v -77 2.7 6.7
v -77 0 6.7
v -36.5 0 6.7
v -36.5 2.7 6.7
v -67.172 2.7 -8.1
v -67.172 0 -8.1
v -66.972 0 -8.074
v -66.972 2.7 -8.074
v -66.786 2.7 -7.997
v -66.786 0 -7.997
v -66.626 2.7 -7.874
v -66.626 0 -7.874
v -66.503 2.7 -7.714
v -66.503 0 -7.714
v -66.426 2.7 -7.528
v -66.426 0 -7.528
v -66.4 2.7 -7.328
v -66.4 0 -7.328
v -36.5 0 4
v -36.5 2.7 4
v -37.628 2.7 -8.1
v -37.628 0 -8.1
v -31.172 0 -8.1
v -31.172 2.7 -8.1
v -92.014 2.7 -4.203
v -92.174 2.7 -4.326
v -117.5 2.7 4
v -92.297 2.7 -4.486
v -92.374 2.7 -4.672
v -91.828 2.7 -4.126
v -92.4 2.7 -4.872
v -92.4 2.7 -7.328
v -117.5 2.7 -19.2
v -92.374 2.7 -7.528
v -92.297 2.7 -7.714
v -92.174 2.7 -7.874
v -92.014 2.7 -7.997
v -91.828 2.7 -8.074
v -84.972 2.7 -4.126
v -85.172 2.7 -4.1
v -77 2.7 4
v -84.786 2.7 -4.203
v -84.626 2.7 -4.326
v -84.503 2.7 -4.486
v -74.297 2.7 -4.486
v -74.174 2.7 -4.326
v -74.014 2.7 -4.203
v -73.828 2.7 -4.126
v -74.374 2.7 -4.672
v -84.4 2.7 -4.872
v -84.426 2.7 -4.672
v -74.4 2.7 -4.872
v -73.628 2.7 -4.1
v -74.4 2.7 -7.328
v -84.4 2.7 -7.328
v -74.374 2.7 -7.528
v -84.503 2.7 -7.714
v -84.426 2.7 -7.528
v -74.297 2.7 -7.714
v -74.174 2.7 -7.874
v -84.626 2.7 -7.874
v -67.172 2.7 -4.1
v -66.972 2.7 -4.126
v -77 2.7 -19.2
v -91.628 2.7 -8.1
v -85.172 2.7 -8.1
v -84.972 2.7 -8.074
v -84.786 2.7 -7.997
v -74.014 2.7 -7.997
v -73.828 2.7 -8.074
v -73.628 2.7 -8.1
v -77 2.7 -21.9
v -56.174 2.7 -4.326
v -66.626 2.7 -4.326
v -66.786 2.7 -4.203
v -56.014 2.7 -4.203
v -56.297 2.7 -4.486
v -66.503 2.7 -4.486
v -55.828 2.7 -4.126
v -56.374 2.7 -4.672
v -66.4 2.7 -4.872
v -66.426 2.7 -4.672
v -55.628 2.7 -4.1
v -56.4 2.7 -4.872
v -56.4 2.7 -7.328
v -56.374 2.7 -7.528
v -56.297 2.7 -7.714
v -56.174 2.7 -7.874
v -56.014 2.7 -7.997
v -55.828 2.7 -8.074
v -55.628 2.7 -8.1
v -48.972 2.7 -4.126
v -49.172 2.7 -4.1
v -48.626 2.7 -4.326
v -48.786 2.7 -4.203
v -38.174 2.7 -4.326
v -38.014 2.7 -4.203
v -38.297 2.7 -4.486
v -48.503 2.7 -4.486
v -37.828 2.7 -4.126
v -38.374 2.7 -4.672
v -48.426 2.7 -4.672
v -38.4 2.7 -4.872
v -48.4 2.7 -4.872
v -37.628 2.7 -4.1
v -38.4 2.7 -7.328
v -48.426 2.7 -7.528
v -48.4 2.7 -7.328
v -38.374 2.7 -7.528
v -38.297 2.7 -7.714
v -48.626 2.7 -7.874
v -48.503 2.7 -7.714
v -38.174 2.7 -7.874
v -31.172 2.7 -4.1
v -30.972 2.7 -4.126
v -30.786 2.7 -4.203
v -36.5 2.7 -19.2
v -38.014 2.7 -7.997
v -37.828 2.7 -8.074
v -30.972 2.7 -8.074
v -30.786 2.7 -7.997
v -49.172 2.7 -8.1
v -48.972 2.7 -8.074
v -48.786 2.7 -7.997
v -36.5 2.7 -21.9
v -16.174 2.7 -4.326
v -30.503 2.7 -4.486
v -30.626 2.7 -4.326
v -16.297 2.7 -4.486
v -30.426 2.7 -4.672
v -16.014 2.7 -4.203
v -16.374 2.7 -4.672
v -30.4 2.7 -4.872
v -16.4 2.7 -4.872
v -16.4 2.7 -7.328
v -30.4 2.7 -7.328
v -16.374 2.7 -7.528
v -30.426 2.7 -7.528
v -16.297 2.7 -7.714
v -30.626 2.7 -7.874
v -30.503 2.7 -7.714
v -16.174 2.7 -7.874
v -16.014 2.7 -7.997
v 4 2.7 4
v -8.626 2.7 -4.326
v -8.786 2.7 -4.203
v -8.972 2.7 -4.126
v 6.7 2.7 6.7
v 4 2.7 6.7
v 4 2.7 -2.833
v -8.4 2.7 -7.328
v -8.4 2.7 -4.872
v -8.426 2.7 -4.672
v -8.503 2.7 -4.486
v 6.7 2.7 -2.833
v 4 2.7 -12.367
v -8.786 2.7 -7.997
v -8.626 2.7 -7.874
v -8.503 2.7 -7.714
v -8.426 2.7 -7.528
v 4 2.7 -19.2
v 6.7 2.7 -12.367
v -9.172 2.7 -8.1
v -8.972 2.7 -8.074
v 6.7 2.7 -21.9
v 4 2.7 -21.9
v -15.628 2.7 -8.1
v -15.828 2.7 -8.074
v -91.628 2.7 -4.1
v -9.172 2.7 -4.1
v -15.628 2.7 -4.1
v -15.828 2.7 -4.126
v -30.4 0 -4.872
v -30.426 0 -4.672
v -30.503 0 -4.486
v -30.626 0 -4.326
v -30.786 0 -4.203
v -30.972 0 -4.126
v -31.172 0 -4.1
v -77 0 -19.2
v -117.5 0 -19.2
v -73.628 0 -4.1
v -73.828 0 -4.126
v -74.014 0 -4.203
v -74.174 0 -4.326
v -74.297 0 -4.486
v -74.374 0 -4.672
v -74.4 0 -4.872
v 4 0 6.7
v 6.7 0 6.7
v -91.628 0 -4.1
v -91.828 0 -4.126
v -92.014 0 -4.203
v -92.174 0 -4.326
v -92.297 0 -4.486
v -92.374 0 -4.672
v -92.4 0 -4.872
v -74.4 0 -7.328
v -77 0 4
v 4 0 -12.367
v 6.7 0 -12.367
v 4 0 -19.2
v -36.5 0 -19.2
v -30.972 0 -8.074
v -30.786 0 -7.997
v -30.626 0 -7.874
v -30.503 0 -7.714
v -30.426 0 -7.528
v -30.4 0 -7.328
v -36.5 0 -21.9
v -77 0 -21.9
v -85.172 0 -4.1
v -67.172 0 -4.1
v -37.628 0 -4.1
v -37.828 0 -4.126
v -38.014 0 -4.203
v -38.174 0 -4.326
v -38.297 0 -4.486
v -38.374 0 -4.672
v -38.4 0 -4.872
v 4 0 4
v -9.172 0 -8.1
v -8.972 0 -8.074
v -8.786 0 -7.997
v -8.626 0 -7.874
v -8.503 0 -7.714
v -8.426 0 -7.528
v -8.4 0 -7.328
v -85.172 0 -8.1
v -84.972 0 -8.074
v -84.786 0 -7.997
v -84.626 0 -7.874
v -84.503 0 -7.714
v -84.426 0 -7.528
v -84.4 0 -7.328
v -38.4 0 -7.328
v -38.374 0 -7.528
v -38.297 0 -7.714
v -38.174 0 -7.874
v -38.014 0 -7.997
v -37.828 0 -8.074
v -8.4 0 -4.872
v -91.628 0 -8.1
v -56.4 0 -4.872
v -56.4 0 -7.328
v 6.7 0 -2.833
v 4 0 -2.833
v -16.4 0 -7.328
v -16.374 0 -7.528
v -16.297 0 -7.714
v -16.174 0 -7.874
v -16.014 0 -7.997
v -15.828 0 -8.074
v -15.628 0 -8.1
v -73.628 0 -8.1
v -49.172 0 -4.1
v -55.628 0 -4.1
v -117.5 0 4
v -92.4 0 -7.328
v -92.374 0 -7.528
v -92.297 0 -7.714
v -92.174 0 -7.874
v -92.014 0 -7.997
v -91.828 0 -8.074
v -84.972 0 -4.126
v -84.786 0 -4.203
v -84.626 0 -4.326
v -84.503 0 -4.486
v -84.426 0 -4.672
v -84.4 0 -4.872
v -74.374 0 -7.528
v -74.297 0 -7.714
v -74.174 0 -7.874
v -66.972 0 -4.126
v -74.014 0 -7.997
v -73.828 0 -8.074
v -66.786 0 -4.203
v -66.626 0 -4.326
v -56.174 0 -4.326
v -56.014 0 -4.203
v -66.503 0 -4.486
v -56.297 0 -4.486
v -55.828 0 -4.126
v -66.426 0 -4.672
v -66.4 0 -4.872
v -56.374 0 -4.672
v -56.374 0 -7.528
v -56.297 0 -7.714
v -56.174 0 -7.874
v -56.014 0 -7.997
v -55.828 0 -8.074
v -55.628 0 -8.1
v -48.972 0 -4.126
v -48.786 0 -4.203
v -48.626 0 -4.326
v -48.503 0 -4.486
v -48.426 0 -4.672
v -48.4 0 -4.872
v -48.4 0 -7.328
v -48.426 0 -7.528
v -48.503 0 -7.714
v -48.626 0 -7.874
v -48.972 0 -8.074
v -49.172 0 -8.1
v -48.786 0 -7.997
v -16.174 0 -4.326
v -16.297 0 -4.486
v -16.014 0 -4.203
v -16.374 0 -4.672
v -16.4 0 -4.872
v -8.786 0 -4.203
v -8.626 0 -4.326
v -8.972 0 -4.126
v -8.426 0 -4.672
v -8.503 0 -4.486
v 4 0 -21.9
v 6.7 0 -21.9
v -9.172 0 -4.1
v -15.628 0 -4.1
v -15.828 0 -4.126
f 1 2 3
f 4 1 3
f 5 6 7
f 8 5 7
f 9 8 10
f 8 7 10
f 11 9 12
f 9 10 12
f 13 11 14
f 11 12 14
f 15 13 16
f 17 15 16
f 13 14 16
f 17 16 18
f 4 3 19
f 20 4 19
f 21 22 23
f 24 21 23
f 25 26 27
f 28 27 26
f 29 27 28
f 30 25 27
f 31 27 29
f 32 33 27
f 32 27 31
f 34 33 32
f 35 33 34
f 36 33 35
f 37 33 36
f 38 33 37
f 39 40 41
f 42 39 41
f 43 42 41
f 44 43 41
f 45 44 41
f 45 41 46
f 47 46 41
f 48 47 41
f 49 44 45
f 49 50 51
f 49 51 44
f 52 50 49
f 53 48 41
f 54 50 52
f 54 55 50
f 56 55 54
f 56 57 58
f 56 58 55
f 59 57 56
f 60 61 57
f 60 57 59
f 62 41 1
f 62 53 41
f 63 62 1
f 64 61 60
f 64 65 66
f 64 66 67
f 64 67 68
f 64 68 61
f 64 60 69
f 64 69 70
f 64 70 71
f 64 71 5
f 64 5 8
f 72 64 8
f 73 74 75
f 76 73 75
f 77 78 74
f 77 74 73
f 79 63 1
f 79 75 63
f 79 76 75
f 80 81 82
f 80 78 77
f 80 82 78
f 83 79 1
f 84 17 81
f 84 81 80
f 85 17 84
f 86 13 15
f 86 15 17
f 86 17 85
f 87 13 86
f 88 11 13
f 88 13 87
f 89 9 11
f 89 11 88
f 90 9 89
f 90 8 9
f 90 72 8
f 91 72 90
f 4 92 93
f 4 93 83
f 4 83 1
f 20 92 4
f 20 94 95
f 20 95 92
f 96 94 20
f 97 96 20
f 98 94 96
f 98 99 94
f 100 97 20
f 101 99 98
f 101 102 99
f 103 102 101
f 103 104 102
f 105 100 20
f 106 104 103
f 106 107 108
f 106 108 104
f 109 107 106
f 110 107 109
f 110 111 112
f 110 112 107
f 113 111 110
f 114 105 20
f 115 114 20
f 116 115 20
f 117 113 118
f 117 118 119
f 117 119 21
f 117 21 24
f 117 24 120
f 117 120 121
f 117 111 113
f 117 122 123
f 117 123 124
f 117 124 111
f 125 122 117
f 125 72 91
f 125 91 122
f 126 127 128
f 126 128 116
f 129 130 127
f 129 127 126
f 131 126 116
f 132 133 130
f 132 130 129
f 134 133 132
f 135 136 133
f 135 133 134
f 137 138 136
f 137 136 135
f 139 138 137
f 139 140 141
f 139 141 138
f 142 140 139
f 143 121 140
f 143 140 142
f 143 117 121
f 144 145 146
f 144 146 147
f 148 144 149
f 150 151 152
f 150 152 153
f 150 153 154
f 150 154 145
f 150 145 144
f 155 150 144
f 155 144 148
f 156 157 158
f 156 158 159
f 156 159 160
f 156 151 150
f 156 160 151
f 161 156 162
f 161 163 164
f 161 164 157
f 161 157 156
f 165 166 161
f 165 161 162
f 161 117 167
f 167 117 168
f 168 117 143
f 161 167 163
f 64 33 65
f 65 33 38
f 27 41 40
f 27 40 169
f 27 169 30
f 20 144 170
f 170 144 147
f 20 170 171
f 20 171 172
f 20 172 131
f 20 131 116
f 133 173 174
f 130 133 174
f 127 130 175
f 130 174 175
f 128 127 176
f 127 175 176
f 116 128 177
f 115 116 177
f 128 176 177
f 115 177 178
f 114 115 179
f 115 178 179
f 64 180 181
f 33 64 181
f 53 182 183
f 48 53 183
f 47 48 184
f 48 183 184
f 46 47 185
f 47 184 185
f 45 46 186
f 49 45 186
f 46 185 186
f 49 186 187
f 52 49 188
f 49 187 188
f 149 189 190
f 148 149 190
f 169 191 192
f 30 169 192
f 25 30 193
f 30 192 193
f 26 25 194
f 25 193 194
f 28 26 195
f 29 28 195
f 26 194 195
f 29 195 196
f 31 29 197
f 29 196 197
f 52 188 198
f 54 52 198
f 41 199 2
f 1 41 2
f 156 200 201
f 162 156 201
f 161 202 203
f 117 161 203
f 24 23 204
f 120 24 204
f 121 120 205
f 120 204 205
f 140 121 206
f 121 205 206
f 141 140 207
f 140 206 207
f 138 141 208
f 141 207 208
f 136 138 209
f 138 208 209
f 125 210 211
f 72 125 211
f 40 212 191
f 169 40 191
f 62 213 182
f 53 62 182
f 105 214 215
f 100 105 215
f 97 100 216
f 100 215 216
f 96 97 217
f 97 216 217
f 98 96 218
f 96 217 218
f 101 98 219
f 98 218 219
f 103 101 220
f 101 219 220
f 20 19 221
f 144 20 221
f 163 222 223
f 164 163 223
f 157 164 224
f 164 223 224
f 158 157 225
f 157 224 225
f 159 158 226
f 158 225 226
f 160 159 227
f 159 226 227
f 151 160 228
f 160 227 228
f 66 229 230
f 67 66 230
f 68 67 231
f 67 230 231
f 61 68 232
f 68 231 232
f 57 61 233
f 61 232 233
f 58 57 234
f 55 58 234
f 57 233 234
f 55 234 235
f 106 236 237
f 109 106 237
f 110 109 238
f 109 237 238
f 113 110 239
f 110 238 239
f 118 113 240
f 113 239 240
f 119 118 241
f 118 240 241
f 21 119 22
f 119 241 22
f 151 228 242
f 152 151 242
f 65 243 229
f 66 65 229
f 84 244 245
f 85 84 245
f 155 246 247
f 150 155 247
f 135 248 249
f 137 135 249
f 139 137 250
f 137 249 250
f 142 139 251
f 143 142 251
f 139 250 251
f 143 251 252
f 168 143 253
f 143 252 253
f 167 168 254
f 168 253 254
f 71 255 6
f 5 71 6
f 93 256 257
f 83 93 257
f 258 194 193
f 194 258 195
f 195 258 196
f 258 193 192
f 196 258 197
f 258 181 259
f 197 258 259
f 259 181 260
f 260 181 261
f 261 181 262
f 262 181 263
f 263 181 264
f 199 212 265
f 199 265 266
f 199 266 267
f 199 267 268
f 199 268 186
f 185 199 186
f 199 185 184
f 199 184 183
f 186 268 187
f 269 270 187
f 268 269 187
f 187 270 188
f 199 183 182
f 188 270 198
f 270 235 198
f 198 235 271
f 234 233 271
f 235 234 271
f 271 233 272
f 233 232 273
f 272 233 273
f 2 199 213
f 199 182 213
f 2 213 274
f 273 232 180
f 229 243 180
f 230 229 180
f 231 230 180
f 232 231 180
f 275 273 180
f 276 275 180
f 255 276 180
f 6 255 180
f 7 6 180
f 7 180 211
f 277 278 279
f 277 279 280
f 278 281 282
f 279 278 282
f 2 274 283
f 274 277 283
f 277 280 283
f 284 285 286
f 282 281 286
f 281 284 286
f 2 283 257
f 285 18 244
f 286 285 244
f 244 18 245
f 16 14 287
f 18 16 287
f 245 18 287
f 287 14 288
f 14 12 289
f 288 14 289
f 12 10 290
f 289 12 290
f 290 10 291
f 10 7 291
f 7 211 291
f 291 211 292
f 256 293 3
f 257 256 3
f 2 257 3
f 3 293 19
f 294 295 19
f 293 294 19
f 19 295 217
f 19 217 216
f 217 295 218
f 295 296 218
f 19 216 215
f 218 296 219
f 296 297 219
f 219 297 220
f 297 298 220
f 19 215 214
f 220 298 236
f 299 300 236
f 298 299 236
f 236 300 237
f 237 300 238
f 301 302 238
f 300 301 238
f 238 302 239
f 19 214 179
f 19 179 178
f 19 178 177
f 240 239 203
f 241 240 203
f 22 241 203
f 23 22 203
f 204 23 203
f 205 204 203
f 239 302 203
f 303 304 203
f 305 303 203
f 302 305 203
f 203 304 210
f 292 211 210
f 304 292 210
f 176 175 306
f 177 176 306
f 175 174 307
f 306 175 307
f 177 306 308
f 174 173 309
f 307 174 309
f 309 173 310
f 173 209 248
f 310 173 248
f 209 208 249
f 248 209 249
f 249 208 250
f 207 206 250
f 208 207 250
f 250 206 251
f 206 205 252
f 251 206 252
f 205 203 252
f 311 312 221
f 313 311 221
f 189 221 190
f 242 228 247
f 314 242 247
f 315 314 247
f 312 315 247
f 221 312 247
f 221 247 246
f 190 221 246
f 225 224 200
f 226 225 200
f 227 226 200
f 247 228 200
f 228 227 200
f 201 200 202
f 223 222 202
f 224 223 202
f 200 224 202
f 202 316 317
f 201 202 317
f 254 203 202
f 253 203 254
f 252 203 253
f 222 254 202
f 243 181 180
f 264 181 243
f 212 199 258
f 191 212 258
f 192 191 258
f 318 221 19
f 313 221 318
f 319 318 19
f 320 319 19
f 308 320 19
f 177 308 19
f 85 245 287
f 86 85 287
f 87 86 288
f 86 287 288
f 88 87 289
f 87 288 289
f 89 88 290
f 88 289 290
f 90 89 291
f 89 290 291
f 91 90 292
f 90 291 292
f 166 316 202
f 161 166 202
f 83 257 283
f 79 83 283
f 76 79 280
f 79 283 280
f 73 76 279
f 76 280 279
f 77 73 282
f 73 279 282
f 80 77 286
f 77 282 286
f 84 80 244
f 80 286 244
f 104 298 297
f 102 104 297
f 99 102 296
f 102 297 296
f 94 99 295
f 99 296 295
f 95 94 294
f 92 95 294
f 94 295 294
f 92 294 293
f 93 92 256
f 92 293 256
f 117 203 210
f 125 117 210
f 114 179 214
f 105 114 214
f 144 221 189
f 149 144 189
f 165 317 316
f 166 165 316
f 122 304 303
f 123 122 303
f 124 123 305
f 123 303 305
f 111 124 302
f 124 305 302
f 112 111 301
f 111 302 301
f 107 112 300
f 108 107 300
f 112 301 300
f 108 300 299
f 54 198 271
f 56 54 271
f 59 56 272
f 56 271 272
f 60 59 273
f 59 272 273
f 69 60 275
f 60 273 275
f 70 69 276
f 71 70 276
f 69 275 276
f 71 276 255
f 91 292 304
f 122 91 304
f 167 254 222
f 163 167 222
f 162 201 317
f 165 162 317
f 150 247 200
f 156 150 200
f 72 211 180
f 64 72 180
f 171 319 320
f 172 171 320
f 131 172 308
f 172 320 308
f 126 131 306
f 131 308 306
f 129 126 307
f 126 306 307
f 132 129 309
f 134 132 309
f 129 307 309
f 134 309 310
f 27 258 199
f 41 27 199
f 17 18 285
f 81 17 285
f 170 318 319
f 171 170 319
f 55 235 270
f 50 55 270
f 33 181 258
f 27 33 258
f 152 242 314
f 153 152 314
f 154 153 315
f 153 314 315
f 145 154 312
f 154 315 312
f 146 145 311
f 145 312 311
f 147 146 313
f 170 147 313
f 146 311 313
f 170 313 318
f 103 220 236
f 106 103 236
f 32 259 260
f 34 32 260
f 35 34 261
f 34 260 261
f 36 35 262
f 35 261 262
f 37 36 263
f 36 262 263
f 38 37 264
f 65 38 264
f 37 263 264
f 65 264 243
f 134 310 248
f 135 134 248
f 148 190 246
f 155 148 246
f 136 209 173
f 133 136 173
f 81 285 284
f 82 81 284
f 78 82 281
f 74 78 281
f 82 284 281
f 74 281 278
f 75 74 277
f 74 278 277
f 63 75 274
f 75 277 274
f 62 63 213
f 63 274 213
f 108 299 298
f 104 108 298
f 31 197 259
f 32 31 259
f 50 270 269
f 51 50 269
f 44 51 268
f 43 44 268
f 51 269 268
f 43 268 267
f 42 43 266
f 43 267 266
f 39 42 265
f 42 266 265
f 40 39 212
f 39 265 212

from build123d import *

# Parameters (mm, degrees)
BOSS_EXTRUDE1_DEPTH = 2.7


with BuildPart() as part:
    # Sketch1 → Boss-Extrude1 (new body)
    with BuildSketch(Plane(origin=(0, 0, 0), x_dir=(1, 0, 0), z_dir=(0, 1, 0))):
        Polygon((4, 2.833333333), (4, 12.366666667), (6.7, 12.366666667), (6.7, 21.9), (4, 21.9), (4, 19.2), (-36.5, 19.2), (-36.5, 21.9), (-77, 21.9), (-77, 19.2), (-117.5, 19.2), (-117.5, 12.366666667), (-117.5, 2.833333333), (-117.5, -4), (-77, -4), (-77, -6.7), (-36.5, -6.7), (-36.5, -4), (4, -4), (4, -6.7), (6.7, -6.7), (6.7, 2.833333333), align=None)
        with BuildLine():
            Line((-91.627899854, 8.1), (-85.172100146, 8.1))
            ThreePointArc((-85.172100146, 8.1), (-84.626142897, 7.873857103), (-84.4, 7.327899854))
            Line((-84.4, 7.327899854), (-84.4, 4.872100146))
            ThreePointArc((-84.4, 4.872100146), (-84.626142897, 4.326142897), (-85.172100146, 4.1))
            Line((-85.172100146, 4.1), (-91.627899854, 4.1))
            ThreePointArc((-91.627899854, 4.1), (-92.173857103, 4.326142897), (-92.4, 4.872100146))
            Line((-92.4, 4.872100146), (-92.4, 7.327899854))
            ThreePointArc((-92.4, 7.327899854), (-92.173857103, 7.873857103), (-91.627899854, 8.1))
        make_face(mode=Mode.SUBTRACT)
        with BuildLine():
            Line((-73.627899854, 8.1), (-67.172100146, 8.1))
            ThreePointArc((-67.172100146, 8.1), (-66.626142897, 7.873857103), (-66.4, 7.327899854))
            Line((-66.4, 7.327899854), (-66.4, 4.872100146))
            ThreePointArc((-66.4, 4.872100146), (-66.626142897, 4.326142897), (-67.172100146, 4.1))
            Line((-67.172100146, 4.1), (-73.627899854, 4.1))
            ThreePointArc((-73.627899854, 4.1), (-74.173857103, 4.326142897), (-74.4, 4.872100146))
            Line((-74.4, 4.872100146), (-74.4, 7.327899854))
            ThreePointArc((-74.4, 7.327899854), (-74.173857103, 7.873857103), (-73.627899854, 8.1))
        make_face(mode=Mode.SUBTRACT)
        with BuildLine():
            Line((-55.627899854, 8.1), (-49.172100146, 8.1))
            ThreePointArc((-49.172100146, 8.1), (-48.626142897, 7.873857103), (-48.4, 7.327899854))
            Line((-48.4, 7.327899854), (-48.4, 4.872100146))
            ThreePointArc((-48.4, 4.872100146), (-48.626142897, 4.326142897), (-49.172100146, 4.1))
            Line((-49.172100146, 4.1), (-55.627899854, 4.1))
            ThreePointArc((-55.627899854, 4.1), (-56.173857103, 4.326142897), (-56.4, 4.872100146))
            Line((-56.4, 4.872100146), (-56.4, 7.327899854))
            ThreePointArc((-56.4, 7.327899854), (-56.173857103, 7.873857103), (-55.627899854, 8.1))
        make_face(mode=Mode.SUBTRACT)
        with BuildLine():
            Line((-37.627899854, 8.1), (-31.172100146, 8.1))
            ThreePointArc((-31.172100146, 8.1), (-30.626142897, 7.873857103), (-30.4, 7.327899854))
            Line((-30.4, 7.327899854), (-30.4, 4.872100146))
            ThreePointArc((-30.4, 4.872100146), (-30.626142897, 4.326142897), (-31.172100146, 4.1))
            Line((-31.172100146, 4.1), (-37.627899854, 4.1))
            ThreePointArc((-37.627899854, 4.1), (-38.173857103, 4.326142897), (-38.4, 4.872100146))
            Line((-38.4, 4.872100146), (-38.4, 7.327899854))
            ThreePointArc((-38.4, 7.327899854), (-38.173857103, 7.873857103), (-37.627899854, 8.1))
        make_face(mode=Mode.SUBTRACT)
        with BuildLine():
            Line((-15.627899854, 8.1), (-9.172100146, 8.1))
            ThreePointArc((-9.172100146, 8.1), (-8.626142897, 7.873857103), (-8.4, 7.327899854))
            Line((-8.4, 7.327899854), (-8.4, 4.872100146))
            ThreePointArc((-8.4, 4.872100146), (-8.626142897, 4.326142897), (-9.172100146, 4.1))
            Line((-9.172100146, 4.1), (-15.627899854, 4.1))
            ThreePointArc((-15.627899854, 4.1), (-16.173857103, 4.326142897), (-16.4, 4.872100146))
            Line((-16.4, 4.872100146), (-16.4, 7.327899854))
            ThreePointArc((-16.4, 7.327899854), (-16.173857103, 7.873857103), (-15.627899854, 8.1))
        make_face(mode=Mode.SUBTRACT)
    extrude(amount=BOSS_EXTRUDE1_DEPTH)


solid = part.part
